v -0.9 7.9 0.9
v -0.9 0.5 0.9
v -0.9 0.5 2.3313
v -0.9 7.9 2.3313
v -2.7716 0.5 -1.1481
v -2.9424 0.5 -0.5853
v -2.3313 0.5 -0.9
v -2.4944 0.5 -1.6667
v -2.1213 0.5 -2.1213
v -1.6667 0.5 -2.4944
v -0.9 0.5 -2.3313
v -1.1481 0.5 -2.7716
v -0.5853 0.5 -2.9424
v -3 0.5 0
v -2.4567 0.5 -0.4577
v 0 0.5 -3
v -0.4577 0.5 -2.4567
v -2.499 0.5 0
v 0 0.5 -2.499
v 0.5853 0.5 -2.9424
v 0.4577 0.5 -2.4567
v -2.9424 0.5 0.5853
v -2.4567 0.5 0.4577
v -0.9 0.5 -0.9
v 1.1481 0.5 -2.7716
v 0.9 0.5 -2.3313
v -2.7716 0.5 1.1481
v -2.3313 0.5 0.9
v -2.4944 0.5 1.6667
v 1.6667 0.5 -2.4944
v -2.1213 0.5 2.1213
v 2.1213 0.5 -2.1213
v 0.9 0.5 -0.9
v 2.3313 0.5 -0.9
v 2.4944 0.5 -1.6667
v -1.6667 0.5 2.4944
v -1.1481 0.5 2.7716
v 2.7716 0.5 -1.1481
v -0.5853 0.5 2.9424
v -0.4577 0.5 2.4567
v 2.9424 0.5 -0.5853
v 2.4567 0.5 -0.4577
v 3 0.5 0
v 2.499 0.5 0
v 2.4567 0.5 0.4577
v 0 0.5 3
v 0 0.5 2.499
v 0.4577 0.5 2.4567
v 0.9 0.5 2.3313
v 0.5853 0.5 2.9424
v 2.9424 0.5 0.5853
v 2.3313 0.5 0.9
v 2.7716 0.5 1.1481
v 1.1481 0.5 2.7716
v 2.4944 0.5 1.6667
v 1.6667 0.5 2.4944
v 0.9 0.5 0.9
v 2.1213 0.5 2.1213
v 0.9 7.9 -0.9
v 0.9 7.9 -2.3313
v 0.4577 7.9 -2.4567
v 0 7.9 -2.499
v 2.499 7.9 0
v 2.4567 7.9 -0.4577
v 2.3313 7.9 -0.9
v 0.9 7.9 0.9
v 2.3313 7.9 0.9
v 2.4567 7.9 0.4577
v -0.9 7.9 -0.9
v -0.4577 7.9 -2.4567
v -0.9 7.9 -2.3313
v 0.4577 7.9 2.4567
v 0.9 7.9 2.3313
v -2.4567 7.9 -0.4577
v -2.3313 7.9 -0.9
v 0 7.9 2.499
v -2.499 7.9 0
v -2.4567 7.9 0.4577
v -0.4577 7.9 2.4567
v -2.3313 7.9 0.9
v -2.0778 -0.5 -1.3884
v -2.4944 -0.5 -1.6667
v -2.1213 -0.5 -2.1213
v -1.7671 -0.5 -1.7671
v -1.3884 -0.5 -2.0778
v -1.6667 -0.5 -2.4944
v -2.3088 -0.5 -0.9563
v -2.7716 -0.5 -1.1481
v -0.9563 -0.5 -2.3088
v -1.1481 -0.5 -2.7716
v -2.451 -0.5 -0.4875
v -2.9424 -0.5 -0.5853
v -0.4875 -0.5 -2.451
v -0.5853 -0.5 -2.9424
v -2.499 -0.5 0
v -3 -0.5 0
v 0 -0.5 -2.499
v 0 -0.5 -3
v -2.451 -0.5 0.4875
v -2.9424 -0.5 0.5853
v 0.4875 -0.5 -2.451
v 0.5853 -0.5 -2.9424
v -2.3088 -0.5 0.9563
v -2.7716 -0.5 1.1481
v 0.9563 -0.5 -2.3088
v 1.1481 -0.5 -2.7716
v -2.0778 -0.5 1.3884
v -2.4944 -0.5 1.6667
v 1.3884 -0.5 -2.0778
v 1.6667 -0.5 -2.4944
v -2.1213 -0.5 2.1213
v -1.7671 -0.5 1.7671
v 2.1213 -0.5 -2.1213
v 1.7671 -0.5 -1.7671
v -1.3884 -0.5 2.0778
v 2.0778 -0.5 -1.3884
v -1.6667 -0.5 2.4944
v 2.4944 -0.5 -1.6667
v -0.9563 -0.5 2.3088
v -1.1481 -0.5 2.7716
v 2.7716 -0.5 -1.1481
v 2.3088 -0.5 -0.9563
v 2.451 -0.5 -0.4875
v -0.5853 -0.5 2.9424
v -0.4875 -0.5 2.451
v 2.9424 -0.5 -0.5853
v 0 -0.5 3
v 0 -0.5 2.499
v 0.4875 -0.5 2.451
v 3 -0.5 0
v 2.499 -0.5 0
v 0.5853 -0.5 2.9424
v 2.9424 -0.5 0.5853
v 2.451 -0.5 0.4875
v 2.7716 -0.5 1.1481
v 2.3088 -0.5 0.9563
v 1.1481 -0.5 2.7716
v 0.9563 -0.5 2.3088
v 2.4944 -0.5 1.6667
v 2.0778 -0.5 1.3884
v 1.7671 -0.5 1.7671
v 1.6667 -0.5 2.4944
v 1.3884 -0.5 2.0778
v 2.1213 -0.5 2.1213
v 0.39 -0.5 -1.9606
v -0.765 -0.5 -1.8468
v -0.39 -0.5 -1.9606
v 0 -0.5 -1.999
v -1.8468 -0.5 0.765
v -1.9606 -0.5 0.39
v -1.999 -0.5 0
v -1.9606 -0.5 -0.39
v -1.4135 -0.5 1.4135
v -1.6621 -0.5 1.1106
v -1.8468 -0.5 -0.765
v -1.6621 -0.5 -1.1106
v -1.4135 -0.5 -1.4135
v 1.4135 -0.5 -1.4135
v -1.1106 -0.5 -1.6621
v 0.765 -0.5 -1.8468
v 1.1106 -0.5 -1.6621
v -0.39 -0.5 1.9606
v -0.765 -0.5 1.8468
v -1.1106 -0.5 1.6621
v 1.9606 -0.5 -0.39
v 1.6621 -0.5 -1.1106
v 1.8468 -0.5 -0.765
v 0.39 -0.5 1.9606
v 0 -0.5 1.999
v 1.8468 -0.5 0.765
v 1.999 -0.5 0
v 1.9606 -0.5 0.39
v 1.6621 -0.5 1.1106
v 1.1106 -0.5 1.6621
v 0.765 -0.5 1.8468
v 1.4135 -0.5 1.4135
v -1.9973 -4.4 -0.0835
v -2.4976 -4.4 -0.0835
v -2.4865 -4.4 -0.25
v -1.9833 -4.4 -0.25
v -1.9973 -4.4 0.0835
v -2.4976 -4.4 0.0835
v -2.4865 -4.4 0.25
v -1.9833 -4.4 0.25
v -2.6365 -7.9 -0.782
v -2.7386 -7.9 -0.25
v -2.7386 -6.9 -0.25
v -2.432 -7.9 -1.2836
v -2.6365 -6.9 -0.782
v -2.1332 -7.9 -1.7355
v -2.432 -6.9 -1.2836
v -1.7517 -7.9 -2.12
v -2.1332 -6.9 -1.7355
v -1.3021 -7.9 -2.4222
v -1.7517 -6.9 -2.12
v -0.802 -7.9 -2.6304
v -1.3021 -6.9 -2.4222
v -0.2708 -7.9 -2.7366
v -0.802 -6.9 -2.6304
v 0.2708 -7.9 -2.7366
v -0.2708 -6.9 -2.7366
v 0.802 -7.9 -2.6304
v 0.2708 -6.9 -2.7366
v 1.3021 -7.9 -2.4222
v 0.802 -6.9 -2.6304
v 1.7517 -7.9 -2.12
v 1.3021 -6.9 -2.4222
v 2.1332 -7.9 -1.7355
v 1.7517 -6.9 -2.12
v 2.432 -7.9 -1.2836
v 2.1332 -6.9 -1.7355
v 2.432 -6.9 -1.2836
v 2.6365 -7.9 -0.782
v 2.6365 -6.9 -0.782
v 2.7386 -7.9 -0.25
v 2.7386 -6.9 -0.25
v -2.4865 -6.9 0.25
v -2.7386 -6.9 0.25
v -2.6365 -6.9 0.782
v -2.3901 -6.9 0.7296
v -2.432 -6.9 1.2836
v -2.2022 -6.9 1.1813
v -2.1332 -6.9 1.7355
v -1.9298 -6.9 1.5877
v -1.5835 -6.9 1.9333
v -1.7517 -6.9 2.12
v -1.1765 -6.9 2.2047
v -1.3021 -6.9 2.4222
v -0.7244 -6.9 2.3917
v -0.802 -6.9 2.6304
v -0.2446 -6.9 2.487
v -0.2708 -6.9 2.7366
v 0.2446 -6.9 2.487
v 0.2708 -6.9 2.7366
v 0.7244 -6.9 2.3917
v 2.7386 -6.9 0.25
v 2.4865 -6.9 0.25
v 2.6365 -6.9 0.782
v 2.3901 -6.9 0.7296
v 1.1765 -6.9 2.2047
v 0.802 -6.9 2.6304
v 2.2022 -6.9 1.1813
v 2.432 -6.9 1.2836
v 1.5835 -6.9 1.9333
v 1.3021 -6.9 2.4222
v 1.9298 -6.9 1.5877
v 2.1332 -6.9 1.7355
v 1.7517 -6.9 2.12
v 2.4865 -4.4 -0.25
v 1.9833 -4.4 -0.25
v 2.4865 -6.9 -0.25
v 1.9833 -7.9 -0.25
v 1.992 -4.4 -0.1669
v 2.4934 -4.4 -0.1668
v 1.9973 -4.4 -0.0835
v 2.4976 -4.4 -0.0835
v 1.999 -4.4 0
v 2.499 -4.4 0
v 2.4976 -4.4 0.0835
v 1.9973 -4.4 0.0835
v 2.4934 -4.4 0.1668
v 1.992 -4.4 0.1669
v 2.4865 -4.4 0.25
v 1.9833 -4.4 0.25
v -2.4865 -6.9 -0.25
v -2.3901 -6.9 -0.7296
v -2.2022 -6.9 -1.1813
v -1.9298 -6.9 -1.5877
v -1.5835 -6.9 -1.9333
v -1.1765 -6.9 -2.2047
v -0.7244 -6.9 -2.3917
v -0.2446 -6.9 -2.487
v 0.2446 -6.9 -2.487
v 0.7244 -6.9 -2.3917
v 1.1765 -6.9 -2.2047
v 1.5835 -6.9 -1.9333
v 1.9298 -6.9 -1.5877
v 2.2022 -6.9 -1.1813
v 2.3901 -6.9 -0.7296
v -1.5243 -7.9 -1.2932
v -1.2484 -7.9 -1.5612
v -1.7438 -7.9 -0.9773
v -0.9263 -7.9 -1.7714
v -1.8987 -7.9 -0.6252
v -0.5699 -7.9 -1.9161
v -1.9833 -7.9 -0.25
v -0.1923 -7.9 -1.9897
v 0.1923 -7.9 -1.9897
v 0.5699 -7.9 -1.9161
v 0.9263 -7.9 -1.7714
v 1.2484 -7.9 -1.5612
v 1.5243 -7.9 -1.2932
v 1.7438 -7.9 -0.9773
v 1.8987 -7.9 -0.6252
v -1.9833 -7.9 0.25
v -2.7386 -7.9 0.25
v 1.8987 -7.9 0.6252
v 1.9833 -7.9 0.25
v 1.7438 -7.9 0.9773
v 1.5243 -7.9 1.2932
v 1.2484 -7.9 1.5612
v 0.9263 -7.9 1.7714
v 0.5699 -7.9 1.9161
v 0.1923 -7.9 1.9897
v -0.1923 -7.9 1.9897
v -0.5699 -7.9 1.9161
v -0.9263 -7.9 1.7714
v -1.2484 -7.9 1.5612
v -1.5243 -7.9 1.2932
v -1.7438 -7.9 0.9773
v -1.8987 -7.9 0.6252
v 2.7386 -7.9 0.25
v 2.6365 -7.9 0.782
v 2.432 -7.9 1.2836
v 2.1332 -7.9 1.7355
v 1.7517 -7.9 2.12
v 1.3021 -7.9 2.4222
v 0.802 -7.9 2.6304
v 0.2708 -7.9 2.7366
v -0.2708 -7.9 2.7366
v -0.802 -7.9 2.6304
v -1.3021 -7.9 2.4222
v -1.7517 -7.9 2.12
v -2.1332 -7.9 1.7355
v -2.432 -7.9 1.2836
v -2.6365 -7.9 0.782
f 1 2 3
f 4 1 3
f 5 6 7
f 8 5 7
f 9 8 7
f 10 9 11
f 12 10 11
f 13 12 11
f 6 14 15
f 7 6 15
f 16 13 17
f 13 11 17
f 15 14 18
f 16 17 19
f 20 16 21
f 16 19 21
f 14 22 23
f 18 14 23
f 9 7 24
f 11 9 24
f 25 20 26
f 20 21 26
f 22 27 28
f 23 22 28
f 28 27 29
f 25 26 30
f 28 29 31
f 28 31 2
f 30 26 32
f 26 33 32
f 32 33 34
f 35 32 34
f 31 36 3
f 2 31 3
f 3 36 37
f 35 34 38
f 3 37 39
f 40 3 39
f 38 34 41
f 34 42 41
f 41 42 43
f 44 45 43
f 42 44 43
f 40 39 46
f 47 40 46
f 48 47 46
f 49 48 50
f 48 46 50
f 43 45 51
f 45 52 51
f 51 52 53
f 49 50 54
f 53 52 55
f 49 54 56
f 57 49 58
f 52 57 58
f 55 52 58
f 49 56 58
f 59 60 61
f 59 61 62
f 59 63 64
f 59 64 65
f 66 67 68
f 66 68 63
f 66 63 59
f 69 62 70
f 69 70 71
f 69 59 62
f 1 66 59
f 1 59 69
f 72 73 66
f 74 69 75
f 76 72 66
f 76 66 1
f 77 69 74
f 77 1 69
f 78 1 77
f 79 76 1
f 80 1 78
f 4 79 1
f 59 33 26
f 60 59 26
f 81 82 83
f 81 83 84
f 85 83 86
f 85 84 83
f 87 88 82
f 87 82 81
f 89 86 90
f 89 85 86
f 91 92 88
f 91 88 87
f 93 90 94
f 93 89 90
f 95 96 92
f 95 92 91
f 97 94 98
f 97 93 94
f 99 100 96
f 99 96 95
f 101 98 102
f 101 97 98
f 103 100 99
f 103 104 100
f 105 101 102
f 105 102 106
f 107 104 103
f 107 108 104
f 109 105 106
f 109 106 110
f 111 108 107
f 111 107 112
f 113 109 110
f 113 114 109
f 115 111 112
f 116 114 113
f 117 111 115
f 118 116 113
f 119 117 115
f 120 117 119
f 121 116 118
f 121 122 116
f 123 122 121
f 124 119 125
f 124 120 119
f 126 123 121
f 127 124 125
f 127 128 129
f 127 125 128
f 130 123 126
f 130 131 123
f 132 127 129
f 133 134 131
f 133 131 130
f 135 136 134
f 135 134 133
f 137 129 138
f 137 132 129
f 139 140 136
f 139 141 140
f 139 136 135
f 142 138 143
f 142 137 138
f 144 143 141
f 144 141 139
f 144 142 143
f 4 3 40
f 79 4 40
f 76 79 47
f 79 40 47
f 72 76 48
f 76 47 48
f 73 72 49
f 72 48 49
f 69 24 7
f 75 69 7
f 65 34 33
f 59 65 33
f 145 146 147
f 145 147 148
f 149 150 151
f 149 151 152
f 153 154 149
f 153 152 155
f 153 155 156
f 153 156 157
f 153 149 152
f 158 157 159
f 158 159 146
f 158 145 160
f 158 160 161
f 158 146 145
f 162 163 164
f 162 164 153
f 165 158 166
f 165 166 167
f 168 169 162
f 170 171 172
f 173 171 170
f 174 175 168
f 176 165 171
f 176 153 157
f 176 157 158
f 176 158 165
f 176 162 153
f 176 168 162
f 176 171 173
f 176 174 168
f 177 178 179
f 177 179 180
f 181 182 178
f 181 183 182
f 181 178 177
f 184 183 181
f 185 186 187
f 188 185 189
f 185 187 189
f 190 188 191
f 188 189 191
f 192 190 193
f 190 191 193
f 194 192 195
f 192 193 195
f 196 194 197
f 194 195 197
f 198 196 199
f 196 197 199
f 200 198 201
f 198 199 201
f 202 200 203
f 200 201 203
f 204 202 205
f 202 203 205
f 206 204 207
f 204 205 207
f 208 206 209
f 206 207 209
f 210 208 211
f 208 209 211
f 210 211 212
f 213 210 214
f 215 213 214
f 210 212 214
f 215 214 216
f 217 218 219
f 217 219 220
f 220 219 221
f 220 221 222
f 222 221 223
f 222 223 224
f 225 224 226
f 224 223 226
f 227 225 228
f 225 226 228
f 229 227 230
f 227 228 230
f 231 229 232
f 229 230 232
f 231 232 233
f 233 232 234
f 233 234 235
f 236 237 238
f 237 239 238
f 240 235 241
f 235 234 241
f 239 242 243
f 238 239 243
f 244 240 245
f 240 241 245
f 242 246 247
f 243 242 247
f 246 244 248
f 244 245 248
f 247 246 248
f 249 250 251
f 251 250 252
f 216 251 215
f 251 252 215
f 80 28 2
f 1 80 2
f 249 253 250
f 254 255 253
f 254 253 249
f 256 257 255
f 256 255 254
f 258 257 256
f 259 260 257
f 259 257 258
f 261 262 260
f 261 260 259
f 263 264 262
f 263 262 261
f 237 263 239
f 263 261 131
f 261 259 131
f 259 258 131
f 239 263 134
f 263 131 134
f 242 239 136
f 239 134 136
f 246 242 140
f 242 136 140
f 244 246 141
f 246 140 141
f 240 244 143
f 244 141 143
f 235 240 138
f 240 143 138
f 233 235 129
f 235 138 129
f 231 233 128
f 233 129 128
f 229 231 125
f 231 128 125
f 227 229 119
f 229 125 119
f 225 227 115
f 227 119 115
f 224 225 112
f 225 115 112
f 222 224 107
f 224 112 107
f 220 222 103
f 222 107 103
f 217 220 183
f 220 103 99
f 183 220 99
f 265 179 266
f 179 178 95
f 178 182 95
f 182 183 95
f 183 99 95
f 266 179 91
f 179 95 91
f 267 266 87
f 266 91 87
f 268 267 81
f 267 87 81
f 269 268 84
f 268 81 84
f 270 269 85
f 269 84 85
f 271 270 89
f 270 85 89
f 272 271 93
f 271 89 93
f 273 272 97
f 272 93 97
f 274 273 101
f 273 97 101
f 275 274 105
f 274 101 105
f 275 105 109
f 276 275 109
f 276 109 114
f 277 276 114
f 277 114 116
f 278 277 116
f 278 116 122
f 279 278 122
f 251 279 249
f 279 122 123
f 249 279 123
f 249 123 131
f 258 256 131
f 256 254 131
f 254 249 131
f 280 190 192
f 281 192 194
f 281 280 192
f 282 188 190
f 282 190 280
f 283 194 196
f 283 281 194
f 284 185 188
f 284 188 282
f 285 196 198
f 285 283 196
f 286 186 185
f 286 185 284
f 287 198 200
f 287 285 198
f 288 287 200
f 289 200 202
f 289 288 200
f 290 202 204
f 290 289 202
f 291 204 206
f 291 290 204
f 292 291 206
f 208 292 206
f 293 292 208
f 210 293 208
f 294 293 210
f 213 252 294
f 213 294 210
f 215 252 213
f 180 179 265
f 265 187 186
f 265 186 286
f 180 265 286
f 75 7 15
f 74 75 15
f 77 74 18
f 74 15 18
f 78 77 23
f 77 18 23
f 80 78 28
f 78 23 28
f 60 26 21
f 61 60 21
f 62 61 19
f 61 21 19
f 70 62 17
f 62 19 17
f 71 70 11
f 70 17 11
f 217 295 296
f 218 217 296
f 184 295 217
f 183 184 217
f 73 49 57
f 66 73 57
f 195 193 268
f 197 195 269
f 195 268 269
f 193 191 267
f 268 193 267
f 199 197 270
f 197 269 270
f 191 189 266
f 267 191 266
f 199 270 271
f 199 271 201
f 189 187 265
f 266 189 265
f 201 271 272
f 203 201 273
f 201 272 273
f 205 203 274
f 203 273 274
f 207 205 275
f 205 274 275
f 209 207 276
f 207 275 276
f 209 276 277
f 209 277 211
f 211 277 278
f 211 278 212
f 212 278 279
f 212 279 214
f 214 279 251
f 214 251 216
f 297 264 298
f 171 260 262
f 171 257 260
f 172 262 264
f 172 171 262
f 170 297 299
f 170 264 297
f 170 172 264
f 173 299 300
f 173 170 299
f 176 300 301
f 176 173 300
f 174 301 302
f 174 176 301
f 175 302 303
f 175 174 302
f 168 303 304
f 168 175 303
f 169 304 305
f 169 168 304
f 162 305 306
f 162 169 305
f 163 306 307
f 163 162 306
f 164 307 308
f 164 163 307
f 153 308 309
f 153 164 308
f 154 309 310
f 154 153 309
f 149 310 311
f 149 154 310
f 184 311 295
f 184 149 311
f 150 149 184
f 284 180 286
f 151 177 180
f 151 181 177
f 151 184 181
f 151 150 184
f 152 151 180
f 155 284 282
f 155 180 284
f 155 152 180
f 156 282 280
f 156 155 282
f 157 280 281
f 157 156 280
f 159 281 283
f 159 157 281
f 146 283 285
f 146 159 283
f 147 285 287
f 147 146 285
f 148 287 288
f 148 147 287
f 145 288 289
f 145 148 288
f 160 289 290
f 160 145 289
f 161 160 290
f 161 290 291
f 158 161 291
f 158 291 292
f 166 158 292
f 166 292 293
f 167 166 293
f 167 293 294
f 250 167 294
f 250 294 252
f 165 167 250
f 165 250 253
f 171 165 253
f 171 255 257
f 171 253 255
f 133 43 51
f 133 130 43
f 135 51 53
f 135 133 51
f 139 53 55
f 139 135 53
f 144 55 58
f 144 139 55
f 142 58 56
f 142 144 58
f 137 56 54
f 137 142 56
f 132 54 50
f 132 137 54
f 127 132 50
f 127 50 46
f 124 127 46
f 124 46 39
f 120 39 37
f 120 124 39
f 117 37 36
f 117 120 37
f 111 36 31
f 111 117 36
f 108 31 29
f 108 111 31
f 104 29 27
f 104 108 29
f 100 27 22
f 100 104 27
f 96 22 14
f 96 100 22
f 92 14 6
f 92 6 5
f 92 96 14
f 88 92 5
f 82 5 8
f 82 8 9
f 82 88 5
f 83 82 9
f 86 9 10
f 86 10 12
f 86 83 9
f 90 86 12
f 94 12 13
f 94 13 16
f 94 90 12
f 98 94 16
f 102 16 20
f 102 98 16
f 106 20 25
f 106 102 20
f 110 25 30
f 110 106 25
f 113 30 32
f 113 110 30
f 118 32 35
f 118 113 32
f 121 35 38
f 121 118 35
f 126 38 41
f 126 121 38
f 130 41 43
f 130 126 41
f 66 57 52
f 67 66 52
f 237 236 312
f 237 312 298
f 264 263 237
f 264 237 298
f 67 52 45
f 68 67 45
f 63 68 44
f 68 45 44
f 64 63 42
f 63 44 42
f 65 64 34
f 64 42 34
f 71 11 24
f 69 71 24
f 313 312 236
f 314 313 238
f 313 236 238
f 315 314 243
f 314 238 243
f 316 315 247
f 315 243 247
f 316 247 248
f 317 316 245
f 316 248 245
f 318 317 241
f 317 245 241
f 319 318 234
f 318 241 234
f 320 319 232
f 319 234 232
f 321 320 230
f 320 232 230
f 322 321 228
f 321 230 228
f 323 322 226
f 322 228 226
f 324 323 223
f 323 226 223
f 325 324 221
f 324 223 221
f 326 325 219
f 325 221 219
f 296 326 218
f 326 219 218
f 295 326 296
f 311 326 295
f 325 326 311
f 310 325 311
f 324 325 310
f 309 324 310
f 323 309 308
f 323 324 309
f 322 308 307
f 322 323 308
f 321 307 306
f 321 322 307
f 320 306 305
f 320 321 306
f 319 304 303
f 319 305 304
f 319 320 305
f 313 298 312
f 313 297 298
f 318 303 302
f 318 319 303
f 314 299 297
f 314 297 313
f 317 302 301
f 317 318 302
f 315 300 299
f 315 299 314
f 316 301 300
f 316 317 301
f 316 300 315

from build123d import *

# Parameters (mm, degrees)
F0_R      = 3
F1_DEPTH  = 0.5
F2_R      = 2.499
F2_R_2    = 1.999
F3_DEPTH  = 5.9
F4_R      = 2.75
F4_R_2    = 1.999
F5_DEPTH  = 1
F7_DEPTH  = 3
F9_DEPTH  = 7.4
F10_DEPTH = 0.5
F11_DEPTH = 0.5


with BuildPart() as f1:
    # F0 (on Front) → F1 (new body, symmetric)
    with BuildSketch(Plane.XZ):
        Circle(F0_R)
    extrude(amount=F1_DEPTH, both=True)

    # F2 (on face) → F3 (join)
    with BuildSketch(Plane.XZ.offset(0.5)):
        Circle(F2_R)
        Circle(F2_R_2, mode=Mode.SUBTRACT)
    extrude(amount=F3_DEPTH)

    # F4 (on face) → F5 (join)
    with BuildSketch(Plane.XZ.offset(6.4)):
        Circle(F4_R)
        Circle(F4_R_2, mode=Mode.SUBTRACT)
    extrude(amount=F5_DEPTH)

    # F6 (on face) → F7 (cut)
    with BuildSketch(Plane.XZ.offset(7.4)):
        with BuildLine():
            ThreePointArc((2.7386127875, -0.25), (2.75, 0), (2.7386127875, 0.25))
            Line((2.7386127875, 0.25), (1.983305574, 0.25))
            ThreePointArc((1.983305574, 0.25), (1.999, 0), (1.983305574, -0.25))
            Line((1.983305574, -0.25), (2.7386127875, -0.25))
        make_face()
        with BuildLine():
            Line((-2.7386127875, -0.25), (-1.983305574, -0.25))
            ThreePointArc((-1.983305574, -0.25), (-1.999, 0), (-1.983305574, 0.25))
            Line((-1.983305574, 0.25), (-2.7386127875, 0.25))
            ThreePointArc((-2.7386127875, 0.25), (-2.75, 0), (-2.7386127875, -0.25))
        make_face()
    extrude(amount=-F7_DEPTH, mode=Mode.SUBTRACT)

    # F8 (on face) → F9 (join)
    with BuildSketch(Plane(origin=(0, 0.5, 0), x_dir=(-1, 0, 0), z_dir=(0, 1, 0))):
        with BuildLine():
            Line((-0.9, -0.9), (-0.9, -2.3313088598))
            ThreePointArc((-0.9, -2.3313088598), (0, -2.499), (0.9, -2.3313088598))
            Line((0.9, -2.3313088598), (0.9, -0.9))
            Line((0.9, -0.9), (2.3313088598, -0.9))
            ThreePointArc((2.3313088598, -0.9), (2.499, 0), (2.3313088598, 0.9))
            Line((2.3313088598, 0.9), (0.9, 0.9))
            Line((0.9, 0.9), (0.9, 2.3313088598))
            ThreePointArc((0.9, 2.3313088598), (0, 2.499), (-0.9, 2.3313088598))
            Line((-0.9, 2.3313088598), (-0.9, 0.9))
            Line((-0.9, 0.9), (-2.3313088598, 0.9))
            ThreePointArc((-2.3313088598, 0.9), (-2.499, 0), (-2.3313088598, -0.9))
            Line((-2.3313088598, -0.9), (-0.9, -0.9))
        make_face()
    extrude(amount=F9_DEPTH)

    # F10 (add): faces of the model
    f10_faces = [f1.faces().sort_by_distance(p)[0] for p in [
        (2.3609591808, -7.4, 0.3102079729),
        (0, -7.4, -2.6897920271),
    ]]
    extrude(f10_faces, amount=F10_DEPTH)

    # F11 (cut): faces of the model
    f11_faces = [f1.faces().sort_by_distance(p)[0] for p in [
        (2.6125381702, -6.4, 0.3102079729),
        (0, -6.4, -2.6897920271),
    ]]
    extrude(f11_faces, amount=-F11_DEPTH, mode=Mode.SUBTRACT)


solid = f1.part
